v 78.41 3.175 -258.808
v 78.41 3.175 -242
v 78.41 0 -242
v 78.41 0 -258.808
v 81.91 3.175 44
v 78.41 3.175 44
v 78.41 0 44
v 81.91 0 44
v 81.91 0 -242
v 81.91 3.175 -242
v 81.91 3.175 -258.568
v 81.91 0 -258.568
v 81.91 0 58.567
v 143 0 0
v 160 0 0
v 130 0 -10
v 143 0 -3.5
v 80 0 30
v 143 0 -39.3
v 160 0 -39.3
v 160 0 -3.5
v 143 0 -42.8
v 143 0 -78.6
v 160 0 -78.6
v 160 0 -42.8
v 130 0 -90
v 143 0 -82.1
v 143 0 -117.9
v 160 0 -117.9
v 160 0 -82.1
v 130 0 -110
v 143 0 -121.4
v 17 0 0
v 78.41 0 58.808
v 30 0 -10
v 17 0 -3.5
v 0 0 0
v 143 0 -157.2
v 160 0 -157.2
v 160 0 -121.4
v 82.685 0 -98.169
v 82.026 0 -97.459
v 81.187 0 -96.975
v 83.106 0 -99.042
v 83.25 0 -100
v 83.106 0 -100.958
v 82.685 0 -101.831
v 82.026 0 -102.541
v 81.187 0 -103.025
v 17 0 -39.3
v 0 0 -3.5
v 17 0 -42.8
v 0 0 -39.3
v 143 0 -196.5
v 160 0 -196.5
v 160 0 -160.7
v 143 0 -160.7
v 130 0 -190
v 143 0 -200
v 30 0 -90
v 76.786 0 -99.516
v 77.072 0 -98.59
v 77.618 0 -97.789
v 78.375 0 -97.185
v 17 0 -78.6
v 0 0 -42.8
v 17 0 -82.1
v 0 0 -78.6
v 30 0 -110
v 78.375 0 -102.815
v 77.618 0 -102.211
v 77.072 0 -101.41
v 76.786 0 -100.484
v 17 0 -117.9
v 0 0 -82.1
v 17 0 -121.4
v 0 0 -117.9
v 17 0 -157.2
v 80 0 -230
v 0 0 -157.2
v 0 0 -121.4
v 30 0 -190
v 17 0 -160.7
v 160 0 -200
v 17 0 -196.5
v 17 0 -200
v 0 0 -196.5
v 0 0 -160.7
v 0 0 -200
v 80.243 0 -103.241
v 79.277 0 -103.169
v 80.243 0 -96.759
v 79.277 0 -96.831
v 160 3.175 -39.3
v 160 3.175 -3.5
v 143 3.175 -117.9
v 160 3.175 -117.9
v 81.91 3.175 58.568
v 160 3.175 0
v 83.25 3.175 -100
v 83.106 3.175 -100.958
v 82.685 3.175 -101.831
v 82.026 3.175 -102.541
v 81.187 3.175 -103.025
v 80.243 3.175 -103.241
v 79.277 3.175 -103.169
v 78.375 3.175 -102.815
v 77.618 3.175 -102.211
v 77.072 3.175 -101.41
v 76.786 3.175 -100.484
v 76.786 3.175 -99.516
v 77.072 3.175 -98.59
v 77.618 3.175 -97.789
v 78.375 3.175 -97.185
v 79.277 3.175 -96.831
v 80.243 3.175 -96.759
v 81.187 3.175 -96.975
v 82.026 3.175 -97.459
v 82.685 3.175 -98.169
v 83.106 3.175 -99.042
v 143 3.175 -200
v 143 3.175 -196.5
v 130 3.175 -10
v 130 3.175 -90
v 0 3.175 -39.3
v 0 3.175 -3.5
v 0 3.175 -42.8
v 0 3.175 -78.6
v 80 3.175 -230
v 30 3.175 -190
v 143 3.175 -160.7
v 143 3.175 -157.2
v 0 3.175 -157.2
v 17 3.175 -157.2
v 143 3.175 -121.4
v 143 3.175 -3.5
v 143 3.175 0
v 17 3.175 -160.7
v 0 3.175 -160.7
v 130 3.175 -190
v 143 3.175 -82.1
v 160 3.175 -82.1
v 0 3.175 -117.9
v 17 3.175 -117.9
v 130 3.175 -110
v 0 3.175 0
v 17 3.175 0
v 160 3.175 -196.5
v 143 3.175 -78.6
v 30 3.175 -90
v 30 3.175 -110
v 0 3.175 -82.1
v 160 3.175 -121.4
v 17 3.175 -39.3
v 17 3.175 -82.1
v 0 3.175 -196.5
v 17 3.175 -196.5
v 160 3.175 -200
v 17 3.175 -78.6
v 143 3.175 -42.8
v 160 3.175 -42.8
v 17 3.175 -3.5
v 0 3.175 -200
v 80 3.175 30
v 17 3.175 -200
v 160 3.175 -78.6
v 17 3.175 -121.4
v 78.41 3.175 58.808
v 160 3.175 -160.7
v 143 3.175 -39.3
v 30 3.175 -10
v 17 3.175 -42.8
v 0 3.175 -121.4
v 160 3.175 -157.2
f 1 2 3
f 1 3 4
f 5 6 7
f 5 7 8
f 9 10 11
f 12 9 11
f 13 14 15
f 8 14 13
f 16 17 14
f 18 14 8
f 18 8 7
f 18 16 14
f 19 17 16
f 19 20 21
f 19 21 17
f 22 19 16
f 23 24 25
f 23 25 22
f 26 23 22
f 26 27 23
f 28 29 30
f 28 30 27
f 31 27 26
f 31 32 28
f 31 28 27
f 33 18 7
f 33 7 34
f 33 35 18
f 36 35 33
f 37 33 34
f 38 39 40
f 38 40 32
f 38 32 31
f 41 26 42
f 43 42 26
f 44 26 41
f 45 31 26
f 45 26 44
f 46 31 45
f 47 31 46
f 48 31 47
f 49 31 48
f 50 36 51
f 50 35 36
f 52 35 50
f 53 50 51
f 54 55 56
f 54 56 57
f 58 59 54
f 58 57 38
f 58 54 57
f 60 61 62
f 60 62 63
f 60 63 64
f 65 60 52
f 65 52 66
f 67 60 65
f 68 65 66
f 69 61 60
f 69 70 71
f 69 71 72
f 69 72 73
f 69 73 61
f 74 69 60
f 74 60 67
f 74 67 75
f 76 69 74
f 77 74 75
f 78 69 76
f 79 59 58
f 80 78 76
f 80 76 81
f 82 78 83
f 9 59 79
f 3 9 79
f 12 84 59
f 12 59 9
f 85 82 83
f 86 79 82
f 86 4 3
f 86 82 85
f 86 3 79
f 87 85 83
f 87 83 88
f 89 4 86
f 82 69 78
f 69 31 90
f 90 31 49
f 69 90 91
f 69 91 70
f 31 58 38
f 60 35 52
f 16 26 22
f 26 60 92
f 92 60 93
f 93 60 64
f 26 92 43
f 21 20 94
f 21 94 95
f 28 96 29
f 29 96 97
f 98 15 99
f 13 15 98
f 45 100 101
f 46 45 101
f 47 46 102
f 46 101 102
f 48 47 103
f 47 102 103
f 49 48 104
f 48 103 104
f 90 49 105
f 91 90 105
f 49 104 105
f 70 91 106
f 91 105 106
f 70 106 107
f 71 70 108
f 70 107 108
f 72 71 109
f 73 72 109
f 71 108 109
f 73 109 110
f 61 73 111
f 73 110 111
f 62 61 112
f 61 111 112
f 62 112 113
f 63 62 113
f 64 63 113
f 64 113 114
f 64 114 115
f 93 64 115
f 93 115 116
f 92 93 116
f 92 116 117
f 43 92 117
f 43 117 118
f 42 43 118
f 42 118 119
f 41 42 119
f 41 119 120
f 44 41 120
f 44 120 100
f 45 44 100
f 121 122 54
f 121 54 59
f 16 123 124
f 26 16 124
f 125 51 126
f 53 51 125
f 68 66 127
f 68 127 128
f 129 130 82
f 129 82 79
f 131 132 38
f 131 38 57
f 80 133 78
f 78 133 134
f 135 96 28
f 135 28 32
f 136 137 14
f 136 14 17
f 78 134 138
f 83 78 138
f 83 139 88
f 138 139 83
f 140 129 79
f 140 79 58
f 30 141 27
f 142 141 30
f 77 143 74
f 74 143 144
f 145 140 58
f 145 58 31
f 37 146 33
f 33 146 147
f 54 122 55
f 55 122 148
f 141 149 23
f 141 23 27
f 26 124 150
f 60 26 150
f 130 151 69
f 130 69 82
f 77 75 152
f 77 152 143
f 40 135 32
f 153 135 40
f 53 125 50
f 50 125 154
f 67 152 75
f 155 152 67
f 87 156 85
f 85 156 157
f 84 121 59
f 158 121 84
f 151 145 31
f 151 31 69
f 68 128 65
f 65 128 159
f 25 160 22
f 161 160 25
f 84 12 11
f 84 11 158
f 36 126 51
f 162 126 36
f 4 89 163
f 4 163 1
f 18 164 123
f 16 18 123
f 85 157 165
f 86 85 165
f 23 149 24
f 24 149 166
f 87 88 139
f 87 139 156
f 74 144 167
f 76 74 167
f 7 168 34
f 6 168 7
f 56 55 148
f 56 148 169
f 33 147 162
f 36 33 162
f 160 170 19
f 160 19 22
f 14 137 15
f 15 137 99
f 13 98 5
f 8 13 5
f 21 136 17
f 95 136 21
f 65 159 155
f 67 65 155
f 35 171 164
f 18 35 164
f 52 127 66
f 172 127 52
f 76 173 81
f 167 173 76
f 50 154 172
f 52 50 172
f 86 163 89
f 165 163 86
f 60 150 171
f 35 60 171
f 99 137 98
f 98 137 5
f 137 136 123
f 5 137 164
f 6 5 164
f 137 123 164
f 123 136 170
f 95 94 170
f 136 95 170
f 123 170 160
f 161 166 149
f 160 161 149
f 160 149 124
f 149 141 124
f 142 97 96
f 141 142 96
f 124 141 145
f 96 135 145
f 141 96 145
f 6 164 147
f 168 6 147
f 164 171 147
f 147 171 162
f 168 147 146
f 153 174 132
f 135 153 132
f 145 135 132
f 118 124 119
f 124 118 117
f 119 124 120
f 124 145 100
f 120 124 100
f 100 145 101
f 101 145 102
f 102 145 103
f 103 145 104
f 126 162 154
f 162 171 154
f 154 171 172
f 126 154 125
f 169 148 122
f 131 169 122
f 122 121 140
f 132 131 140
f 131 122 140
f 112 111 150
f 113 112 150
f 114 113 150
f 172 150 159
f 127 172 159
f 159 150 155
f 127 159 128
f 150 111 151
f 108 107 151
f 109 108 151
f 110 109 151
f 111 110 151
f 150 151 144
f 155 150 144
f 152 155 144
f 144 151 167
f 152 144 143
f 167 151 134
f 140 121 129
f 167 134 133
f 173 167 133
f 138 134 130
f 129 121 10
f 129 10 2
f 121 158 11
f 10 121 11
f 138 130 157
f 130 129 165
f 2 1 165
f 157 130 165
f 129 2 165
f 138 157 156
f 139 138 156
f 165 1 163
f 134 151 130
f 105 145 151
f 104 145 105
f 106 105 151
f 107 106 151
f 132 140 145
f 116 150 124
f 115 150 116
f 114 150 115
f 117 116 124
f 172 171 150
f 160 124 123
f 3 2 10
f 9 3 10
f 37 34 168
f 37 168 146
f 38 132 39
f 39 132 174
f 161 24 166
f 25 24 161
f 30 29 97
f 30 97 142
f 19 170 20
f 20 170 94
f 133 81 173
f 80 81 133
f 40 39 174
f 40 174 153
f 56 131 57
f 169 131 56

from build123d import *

# Parameters (mm, degrees)
BOSS_EXTRUDE1_DEPTH = 3.175
SKETCH3_R           = 3.25
SKETCH3_W           = 17
SKETCH3_H           = 3.5
CUT_EXTRUDE1_DEPTH  = 4.175
SKETCH4_W           = 3.5
SKETCH4_H           = 18
SKETCH4_H_2         = 16
CUT_EXTRUDE2_DEPTH  = 4.175


with BuildPart() as part:
    # Sketch2 → Boss-Extrude1 (new body)
    with BuildSketch(Plane(origin=(0, 0, 0), x_dir=(1, 0, 0), z_dir=(0, 1, 0))):
        Polygon((0, 200), (80, 260), (160, 200), (160, 0), (80, -60), (0, 0), align=None)
    extrude(amount=BOSS_EXTRUDE1_DEPTH)

    # Sketch3 → Cut-Extrude1 (cut, through all)
    with BuildSketch(Plane(origin=(0, 3.175, 0), x_dir=(1, 0, 0), z_dir=(0, 1, 0))):
        with Locations((80, 100)):
            Circle(SKETCH3_R)
        Polygon((30, 190), (80, 230), (130, 190), (130, 110), (30, 110), align=None)
        with Locations((8.5, 158.95)):
            Rectangle(SKETCH3_W, SKETCH3_H)
        Polygon((30, 90), (30, 10), (80, -30), (130, 10), (130, 90), align=None)
        with Locations((8.5, 198.25)):
            Rectangle(SKETCH3_W, SKETCH3_H)
        with Locations((8.5, 119.65)):
            Rectangle(SKETCH3_W, SKETCH3_H)
        with Locations((8.5, 80.35)):
            Rectangle(SKETCH3_W, SKETCH3_H)
        with Locations((8.5, 41.05)):
            Rectangle(SKETCH3_W, SKETCH3_H)
        with Locations((8.5, 1.75)):
            Rectangle(SKETCH3_W, SKETCH3_H)
        with Locations((151.5, 1.75)):
            Rectangle(SKETCH3_W, SKETCH3_H)
        with Locations((151.5, 41.05)):
            Rectangle(SKETCH3_W, SKETCH3_H)
        with Locations((151.5, 80.35)):
            Rectangle(SKETCH3_W, SKETCH3_H)
        with Locations((151.5, 119.65)):
            Rectangle(SKETCH3_W, SKETCH3_H)
        with Locations((151.5, 158.95)):
            Rectangle(SKETCH3_W, SKETCH3_H)
        with Locations((151.5, 198.25)):
            Rectangle(SKETCH3_W, SKETCH3_H)
    extrude(amount=-CUT_EXTRUDE1_DEPTH, mode=Mode.SUBTRACT)

    # Sketch4 → Cut-Extrude2 (cut, through all)
    with BuildSketch(Plane(origin=(0, 3.175, 0), x_dir=(1, 0, 0), z_dir=(0, 1, 0))):
        with Locations((80.16, 251)):
            Rectangle(SKETCH4_W, SKETCH4_H)
        with Locations((80.16, -52)):
            Rectangle(SKETCH4_W, SKETCH4_H_2)
    extrude(amount=-CUT_EXTRUDE2_DEPTH, mode=Mode.SUBTRACT)


solid = part.part
